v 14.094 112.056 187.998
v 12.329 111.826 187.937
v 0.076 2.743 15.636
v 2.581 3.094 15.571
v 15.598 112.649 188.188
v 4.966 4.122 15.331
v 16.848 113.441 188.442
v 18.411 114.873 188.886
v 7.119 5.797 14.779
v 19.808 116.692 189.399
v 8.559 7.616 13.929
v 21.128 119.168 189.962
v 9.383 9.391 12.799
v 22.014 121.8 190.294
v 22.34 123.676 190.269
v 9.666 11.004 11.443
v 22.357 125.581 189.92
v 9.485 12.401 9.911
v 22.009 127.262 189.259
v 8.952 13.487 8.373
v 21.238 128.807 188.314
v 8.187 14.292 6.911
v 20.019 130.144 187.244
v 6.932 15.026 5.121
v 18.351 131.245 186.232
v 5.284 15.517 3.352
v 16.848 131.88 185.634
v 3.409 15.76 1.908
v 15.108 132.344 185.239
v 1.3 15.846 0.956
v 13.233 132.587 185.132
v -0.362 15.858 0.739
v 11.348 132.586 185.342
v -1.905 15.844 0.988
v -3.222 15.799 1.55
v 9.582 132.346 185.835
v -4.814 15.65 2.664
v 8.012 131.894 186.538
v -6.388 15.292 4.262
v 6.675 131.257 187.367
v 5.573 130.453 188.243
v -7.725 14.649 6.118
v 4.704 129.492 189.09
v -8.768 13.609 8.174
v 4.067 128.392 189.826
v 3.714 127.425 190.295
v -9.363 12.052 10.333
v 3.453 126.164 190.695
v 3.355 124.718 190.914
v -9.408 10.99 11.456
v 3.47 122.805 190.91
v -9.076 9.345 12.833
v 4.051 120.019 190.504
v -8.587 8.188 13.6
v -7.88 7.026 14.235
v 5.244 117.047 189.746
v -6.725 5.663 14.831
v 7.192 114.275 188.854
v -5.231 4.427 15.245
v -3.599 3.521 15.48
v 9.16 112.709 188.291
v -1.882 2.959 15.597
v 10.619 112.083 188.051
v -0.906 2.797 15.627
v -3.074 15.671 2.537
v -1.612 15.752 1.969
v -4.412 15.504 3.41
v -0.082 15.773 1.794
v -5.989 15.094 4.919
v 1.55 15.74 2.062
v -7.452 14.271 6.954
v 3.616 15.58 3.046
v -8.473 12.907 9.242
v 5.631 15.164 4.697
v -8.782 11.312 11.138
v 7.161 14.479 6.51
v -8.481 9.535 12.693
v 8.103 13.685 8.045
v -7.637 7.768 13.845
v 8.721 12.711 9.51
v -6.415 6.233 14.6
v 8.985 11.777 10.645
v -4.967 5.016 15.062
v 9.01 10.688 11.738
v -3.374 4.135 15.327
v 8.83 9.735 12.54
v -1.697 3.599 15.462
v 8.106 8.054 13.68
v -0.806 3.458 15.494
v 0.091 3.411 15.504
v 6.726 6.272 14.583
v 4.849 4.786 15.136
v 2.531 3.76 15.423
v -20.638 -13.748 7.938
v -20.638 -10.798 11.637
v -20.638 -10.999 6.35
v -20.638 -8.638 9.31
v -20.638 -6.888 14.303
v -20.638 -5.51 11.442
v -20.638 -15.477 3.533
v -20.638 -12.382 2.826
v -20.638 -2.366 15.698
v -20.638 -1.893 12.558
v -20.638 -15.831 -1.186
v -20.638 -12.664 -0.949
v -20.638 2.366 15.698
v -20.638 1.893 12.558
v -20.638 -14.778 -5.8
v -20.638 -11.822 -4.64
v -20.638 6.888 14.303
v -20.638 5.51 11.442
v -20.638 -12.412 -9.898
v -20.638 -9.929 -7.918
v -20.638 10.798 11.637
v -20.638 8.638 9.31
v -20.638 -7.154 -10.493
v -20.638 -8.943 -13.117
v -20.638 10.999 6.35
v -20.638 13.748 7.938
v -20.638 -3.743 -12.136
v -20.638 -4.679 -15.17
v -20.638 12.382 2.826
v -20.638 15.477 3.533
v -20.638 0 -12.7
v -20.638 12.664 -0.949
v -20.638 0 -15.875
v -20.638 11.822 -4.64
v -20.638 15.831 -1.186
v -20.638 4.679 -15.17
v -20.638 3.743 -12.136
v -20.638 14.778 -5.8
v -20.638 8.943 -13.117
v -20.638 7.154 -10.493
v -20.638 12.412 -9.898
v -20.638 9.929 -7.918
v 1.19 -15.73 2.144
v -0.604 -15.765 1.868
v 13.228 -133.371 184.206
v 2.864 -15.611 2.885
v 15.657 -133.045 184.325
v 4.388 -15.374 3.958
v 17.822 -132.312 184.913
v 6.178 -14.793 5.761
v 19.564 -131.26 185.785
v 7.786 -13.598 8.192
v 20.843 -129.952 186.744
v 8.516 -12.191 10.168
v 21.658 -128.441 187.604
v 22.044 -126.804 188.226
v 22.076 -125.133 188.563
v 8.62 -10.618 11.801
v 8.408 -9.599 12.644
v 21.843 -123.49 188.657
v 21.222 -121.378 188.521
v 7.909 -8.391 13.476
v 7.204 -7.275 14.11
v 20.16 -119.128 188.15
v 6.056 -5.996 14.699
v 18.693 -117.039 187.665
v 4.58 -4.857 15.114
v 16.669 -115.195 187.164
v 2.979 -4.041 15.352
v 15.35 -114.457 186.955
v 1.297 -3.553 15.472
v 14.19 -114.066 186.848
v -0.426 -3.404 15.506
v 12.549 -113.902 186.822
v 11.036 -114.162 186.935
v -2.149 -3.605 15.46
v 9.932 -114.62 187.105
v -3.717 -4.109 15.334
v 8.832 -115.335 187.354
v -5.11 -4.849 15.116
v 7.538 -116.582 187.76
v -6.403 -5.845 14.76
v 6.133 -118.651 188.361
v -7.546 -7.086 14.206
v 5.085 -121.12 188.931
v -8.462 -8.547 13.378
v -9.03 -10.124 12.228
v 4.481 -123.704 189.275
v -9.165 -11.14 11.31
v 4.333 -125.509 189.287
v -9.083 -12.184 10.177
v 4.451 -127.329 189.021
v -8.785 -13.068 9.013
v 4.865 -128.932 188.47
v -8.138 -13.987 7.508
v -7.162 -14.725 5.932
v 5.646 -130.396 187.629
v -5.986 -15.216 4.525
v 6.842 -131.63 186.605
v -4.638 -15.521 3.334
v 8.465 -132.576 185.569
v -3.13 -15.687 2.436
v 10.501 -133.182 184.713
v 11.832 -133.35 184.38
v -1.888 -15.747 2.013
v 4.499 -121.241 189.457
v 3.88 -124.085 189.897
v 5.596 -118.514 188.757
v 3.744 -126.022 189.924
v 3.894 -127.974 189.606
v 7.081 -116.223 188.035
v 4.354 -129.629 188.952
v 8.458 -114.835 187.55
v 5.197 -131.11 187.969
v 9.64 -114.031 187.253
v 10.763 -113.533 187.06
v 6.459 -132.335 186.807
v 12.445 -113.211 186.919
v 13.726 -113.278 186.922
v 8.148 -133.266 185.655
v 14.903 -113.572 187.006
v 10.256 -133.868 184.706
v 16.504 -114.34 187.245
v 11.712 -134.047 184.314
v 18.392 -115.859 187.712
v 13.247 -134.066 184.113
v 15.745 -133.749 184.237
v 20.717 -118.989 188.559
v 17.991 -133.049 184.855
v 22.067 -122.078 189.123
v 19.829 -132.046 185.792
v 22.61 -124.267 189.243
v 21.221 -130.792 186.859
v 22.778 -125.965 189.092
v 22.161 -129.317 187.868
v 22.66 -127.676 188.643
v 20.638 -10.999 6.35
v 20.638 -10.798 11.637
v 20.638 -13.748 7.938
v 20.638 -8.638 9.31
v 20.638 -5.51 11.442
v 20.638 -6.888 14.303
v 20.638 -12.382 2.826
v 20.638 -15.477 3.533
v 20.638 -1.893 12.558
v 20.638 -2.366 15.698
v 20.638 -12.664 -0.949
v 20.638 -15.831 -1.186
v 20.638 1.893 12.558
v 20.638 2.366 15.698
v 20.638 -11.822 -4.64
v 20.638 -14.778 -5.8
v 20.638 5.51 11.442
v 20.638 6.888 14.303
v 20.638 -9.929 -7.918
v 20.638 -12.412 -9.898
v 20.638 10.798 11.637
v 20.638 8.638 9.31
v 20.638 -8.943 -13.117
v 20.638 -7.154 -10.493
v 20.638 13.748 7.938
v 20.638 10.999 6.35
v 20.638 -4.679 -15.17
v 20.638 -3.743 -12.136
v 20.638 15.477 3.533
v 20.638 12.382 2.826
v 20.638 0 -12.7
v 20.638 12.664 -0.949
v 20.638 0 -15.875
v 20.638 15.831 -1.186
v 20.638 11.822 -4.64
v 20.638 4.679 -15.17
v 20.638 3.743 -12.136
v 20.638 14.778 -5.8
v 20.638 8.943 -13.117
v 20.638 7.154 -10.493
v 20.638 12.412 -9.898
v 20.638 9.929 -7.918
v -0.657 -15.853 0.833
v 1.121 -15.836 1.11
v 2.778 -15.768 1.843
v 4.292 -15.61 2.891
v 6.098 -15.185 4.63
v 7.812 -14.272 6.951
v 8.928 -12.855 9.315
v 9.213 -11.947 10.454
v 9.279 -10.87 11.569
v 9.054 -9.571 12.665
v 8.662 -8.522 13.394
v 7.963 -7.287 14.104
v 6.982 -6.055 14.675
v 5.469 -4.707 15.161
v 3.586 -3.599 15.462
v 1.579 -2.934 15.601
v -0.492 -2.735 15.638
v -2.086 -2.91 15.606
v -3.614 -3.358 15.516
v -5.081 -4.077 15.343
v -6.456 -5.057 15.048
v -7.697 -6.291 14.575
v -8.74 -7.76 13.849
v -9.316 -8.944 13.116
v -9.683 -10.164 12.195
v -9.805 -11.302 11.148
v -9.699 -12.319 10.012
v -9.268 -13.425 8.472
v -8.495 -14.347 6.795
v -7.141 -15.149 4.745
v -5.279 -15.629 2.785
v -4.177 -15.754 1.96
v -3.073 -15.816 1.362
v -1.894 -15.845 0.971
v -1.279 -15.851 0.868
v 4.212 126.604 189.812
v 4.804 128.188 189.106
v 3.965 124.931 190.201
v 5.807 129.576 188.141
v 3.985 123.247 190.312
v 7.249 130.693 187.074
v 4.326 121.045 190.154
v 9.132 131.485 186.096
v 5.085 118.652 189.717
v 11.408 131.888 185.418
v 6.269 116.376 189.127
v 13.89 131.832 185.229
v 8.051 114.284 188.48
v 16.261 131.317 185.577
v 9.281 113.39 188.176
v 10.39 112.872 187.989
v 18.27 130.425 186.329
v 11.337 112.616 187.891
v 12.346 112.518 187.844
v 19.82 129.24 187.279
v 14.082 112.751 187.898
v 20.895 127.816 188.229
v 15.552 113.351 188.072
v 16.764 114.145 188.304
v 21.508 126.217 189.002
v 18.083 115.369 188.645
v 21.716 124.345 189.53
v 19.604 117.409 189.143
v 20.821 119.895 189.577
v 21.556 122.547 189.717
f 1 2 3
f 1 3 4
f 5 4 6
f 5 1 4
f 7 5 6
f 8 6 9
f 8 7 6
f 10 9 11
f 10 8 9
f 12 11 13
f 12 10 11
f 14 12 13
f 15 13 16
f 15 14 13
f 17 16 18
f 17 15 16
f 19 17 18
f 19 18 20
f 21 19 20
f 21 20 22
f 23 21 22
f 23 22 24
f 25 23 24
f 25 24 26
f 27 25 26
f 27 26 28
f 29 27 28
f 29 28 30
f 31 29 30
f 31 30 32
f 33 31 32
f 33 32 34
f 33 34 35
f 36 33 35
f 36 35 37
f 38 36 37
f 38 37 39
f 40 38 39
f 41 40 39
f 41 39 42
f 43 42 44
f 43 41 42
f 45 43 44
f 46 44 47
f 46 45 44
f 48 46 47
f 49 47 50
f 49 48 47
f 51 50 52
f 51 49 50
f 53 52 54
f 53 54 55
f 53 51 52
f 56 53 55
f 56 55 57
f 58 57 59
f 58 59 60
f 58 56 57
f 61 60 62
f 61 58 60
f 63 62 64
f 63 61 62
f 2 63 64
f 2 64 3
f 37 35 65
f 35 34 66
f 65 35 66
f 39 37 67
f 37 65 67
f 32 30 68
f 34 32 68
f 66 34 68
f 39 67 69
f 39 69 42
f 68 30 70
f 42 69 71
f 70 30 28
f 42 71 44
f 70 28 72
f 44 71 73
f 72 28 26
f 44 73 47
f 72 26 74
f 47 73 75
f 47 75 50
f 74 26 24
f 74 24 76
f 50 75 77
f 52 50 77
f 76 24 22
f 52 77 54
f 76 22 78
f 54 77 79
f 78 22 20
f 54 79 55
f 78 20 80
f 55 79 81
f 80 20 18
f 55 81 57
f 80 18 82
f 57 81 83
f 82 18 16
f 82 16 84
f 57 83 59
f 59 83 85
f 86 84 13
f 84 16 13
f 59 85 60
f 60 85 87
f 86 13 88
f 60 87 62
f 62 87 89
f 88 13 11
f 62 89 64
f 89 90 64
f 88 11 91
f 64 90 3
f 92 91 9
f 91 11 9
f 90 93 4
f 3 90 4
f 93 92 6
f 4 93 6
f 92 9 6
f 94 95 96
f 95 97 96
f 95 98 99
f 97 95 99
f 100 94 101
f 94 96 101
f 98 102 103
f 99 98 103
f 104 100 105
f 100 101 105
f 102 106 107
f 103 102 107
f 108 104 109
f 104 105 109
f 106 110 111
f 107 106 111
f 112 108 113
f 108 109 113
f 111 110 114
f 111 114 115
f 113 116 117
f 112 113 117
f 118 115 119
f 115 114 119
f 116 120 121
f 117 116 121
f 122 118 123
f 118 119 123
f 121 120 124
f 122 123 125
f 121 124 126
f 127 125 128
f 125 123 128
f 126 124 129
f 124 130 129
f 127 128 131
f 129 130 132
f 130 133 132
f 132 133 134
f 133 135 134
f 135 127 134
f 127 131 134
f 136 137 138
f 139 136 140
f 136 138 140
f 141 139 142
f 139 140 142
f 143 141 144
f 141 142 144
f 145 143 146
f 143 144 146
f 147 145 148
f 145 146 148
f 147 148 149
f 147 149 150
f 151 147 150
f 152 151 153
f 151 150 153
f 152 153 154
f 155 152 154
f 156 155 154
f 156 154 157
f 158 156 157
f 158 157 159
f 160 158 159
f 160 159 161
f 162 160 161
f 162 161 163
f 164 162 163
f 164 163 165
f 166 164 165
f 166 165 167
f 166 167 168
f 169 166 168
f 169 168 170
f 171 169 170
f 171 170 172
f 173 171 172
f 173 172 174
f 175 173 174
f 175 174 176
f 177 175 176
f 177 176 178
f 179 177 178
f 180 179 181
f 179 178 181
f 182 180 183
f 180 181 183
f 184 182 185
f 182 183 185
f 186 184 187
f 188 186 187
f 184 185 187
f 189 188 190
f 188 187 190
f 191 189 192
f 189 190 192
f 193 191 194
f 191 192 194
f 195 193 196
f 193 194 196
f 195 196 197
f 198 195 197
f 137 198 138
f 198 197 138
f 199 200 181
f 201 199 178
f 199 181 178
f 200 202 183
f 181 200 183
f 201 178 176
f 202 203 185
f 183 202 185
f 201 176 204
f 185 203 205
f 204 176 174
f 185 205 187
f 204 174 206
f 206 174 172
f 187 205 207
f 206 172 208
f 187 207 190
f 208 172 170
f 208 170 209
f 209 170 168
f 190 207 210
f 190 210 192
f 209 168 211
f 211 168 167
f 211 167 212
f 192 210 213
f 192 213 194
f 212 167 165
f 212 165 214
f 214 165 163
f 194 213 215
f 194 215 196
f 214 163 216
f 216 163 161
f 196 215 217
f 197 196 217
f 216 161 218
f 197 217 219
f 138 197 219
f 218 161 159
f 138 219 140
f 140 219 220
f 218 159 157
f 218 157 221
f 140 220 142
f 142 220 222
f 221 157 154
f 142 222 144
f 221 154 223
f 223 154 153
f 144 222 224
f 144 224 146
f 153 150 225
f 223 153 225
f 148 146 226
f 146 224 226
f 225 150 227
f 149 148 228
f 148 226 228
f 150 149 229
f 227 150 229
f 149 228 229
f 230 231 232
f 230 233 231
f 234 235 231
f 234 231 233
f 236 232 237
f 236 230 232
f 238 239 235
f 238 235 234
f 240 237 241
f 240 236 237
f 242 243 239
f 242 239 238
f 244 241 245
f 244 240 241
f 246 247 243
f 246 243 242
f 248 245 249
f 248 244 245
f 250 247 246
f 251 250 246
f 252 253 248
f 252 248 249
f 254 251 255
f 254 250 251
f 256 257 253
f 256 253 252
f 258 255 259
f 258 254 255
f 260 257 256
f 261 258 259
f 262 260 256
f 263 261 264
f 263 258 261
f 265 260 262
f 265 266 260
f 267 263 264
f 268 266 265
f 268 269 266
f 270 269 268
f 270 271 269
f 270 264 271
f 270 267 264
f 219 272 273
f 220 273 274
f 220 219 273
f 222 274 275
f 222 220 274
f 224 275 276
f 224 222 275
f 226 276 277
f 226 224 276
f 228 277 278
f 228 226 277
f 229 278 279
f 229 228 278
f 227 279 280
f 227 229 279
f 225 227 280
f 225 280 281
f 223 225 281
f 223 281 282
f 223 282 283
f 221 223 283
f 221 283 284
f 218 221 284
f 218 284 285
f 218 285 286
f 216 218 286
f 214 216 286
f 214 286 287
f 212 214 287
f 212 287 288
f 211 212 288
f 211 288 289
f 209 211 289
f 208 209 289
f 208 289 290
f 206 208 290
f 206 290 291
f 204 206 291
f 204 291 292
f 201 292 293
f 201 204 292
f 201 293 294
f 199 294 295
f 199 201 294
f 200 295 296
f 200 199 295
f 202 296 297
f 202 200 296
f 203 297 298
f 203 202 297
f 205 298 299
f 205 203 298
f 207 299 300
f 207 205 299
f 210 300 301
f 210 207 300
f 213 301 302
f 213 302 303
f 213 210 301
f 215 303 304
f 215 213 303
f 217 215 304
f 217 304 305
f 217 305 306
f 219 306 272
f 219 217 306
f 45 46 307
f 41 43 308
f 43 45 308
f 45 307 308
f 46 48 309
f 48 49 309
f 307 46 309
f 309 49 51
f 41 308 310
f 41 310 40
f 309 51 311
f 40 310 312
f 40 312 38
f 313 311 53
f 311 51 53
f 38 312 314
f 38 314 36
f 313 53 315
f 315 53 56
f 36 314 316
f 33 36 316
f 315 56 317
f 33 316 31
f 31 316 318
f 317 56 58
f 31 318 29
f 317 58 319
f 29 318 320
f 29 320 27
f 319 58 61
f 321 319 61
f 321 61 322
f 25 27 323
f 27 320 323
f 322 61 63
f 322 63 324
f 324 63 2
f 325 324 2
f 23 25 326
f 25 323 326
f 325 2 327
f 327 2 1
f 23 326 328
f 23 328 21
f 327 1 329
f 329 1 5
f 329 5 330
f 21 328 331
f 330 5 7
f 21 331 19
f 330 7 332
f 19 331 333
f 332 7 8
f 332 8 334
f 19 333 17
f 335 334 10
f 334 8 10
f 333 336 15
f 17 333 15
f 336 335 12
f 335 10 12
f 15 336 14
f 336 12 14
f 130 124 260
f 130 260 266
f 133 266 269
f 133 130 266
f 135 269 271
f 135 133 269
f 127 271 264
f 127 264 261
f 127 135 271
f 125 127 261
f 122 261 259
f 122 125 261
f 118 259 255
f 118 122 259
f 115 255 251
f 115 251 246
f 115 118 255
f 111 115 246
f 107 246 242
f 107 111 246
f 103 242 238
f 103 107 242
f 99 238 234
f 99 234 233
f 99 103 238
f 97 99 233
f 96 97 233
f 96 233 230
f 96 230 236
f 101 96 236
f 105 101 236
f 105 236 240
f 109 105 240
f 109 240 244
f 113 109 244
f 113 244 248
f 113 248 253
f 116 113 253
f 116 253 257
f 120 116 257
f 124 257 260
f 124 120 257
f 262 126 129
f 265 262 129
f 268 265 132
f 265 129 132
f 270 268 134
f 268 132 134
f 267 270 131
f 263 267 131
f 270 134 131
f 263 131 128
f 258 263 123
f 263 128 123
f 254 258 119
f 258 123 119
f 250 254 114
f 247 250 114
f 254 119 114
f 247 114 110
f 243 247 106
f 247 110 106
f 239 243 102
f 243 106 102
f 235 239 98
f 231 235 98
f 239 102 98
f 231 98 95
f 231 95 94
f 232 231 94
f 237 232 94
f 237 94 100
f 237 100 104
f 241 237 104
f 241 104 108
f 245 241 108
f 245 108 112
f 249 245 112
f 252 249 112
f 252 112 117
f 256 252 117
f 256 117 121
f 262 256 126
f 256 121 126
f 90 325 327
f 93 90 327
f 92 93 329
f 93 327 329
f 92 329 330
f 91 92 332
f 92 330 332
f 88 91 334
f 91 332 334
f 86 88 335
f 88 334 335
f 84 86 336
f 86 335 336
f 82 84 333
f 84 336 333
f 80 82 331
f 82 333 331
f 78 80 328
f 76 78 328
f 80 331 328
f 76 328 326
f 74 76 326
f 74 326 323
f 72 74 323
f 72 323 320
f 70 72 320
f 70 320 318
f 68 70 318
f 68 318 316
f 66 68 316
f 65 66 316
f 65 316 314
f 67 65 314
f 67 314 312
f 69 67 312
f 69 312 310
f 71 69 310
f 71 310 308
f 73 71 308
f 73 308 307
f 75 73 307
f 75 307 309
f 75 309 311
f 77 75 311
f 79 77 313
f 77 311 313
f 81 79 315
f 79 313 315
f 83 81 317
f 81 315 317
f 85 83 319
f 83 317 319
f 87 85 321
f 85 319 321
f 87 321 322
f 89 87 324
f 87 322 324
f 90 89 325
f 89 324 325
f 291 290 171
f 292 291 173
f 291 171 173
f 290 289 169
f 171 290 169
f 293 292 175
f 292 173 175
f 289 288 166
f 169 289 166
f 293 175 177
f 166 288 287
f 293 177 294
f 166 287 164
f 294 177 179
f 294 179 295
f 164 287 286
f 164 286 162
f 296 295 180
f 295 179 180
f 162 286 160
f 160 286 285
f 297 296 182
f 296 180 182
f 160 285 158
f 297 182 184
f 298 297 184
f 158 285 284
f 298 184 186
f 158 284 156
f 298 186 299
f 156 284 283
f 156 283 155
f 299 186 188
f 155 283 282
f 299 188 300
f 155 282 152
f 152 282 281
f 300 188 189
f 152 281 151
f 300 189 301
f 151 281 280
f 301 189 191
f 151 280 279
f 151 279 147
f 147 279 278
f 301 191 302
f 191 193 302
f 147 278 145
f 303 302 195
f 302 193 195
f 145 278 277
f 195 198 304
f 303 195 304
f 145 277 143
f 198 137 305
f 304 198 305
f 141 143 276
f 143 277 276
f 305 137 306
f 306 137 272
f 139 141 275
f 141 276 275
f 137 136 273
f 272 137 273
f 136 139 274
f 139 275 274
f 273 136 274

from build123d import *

# Parameters (mm, degrees)
BOSS_EXTRUDE1_DEPTH      = 20.6375
BOSS_EXTRUDE1_DEPTH_BACK = 20.6375
SKETCH1_R                = 15.875
SKETCH1_R_2              = 12.7
BOSS_EXTRUDE3_REACH      = 263.213
BOSS_EXTRUDE3_END_RADIUS = 15.875
SKETCH5_R                = 9.525
SKETCH5_R_2              = 8.89
BOSS_EXTRUDE2_REACH      = 346.916
BOSS_EXTRUDE2_END_RADIUS = 15.875
SKETCH4_R                = 9.525
SKETCH4_R_2              = 8.89
SKETCH13_R               = 12.7


with BuildPart() as part:
    # Sketch1 → Boss-Extrude1 (new, two sides: drawn at the far end of the back side and taken through both)
    with BuildSketch(Plane(origin=(0, 0, 0), x_dir=(0, 0, -1), z_dir=(1, 0, 0)).offset(-BOSS_EXTRUDE1_DEPTH_BACK)):
        Circle(SKETCH1_R)
        Circle(SKETCH1_R_2, mode=Mode.SUBTRACT)
    extrude(amount=BOSS_EXTRUDE1_DEPTH + BOSS_EXTRUDE1_DEPTH_BACK)


with BuildPart() as body_2:
    # Boss-Extrude3: up to this cylinder (the profile starts outside it)
    boss_extrude3_end = Plane(origin=(4.191496, 0, 0), z_dir=(1, 0, 0)) * Cylinder(BOSS_EXTRUDE3_END_RADIUS, 559.176, mode=Mode.PRIVATE)
    # Sketch5 → Boss-Extrude3 (new, up to the surface)
    with BuildSketch(Plane(origin=(13.430426637, 129.680735262, 198.333490367), x_dir=(0.9981998705093698, -0.0321242199519742, -0.05064635236179303), z_dir=(0.059975127583038426, 0.5339450472183996, 0.8433893944213071)), mode=Mode.PRIVATE) as boss_extrude3_sk1:
        Circle(SKETCH5_R)
        Circle(SKETCH5_R_2, mode=Mode.SUBTRACT)
    boss_extrude3_tool1 = extrude(boss_extrude3_sk1.sketch, amount=-BOSS_EXTRUDE3_REACH, mode=Mode.PRIVATE) - boss_extrude3_end
    add(boss_extrude3_tool1.solids().sort_by_distance((4.191496, 129.978064, 198.802252))[0])


with BuildPart() as body_3:
    # Boss-Extrude2: up to this cylinder (the profile starts outside it)
    boss_extrude2_end = Plane(origin=(4.617488, 0, 0), z_dir=(1, 0, 0)) * Cylinder(BOSS_EXTRUDE2_END_RADIUS, 726.582, mode=Mode.PRIVATE)
    # Sketch4 → Boss-Extrude2 (new, up to the surface)
    with BuildSketch(Plane(origin=(13.854330205, -131.227315899, 197.284292217), x_dir=(0.9979742198540056, 0.03453869256304647, -0.05342785062890198), z_dir=(0.06361958969409028, -0.5409266161491856, 0.8386602075623639)), mode=Mode.PRIVATE) as boss_extrude2_sk1:
        Circle(SKETCH4_R)
        Circle(SKETCH4_R_2, mode=Mode.SUBTRACT)
    boss_extrude2_tool1 = extrude(boss_extrude2_sk1.sketch, amount=-BOSS_EXTRUDE2_REACH, mode=Mode.PRIVATE) - boss_extrude2_end
    add(boss_extrude2_tool1.solids().sort_by_distance((4.617488, -131.546992, 197.778799))[0])


with BuildPart() as cut_sweep4_tool:
    # Cut-Sweep4: sweep along a path in FRH
    with BuildLine(Plane(origin=(-218.965343182, 0, 773.533205035), x_dir=(-0.3746065934159059, 0, 0.92718385456679), z_dir=(-0.92718385456679, 0, -0.3746065934159059))) as cut_sweep4_path:
        ThreePointArc((-696.824125417, 212.650771438), (-647.952914491, 193.600771438), (-622.972204466, 147.478522099))
        Line((-622.972204466, 147.478522099), (-605.102710502, 25.124814599))
        ThreePointArc((-605.102710502, 25.124814599), (-603.502914491, 3.100771438), (-605.102710502, -18.923271722))
        Line((-605.102710502, -18.923271722), (-622.972204466, -141.276979223))
        ThreePointArc((-622.972204466, -141.276979223), (-647.952914491, -187.399228562), (-696.824125417, -206.449228562))
    # Sketch13 → Cut-Sweep4 (sweep)
    with BuildSketch(Plane(origin=(42.06956865, 212.650771438, 127.449126476), x_dir=(0.7803123863430683, -0.5469316613994696, 0.3032793060503835), z_dir=(-0.37452926772752637, -0.020317336522068737, 0.926992466772051))):
        Circle(SKETCH13_R)
    sweep(path=cut_sweep4_path.line)


with BuildPart() as body_2_1:
    add(body_2.part)

    # Cut-Sweep4: cut by cut_sweep4_tool
    add(cut_sweep4_tool.part, mode=Mode.SUBTRACT)


with BuildPart() as body_3_1:
    add(body_3.part)

    # Cut-Sweep4: cut by cut_sweep4_tool
    add(cut_sweep4_tool.part, mode=Mode.SUBTRACT)


solid = Compound([part.part, body_2_1.part, body_3_1.part])
